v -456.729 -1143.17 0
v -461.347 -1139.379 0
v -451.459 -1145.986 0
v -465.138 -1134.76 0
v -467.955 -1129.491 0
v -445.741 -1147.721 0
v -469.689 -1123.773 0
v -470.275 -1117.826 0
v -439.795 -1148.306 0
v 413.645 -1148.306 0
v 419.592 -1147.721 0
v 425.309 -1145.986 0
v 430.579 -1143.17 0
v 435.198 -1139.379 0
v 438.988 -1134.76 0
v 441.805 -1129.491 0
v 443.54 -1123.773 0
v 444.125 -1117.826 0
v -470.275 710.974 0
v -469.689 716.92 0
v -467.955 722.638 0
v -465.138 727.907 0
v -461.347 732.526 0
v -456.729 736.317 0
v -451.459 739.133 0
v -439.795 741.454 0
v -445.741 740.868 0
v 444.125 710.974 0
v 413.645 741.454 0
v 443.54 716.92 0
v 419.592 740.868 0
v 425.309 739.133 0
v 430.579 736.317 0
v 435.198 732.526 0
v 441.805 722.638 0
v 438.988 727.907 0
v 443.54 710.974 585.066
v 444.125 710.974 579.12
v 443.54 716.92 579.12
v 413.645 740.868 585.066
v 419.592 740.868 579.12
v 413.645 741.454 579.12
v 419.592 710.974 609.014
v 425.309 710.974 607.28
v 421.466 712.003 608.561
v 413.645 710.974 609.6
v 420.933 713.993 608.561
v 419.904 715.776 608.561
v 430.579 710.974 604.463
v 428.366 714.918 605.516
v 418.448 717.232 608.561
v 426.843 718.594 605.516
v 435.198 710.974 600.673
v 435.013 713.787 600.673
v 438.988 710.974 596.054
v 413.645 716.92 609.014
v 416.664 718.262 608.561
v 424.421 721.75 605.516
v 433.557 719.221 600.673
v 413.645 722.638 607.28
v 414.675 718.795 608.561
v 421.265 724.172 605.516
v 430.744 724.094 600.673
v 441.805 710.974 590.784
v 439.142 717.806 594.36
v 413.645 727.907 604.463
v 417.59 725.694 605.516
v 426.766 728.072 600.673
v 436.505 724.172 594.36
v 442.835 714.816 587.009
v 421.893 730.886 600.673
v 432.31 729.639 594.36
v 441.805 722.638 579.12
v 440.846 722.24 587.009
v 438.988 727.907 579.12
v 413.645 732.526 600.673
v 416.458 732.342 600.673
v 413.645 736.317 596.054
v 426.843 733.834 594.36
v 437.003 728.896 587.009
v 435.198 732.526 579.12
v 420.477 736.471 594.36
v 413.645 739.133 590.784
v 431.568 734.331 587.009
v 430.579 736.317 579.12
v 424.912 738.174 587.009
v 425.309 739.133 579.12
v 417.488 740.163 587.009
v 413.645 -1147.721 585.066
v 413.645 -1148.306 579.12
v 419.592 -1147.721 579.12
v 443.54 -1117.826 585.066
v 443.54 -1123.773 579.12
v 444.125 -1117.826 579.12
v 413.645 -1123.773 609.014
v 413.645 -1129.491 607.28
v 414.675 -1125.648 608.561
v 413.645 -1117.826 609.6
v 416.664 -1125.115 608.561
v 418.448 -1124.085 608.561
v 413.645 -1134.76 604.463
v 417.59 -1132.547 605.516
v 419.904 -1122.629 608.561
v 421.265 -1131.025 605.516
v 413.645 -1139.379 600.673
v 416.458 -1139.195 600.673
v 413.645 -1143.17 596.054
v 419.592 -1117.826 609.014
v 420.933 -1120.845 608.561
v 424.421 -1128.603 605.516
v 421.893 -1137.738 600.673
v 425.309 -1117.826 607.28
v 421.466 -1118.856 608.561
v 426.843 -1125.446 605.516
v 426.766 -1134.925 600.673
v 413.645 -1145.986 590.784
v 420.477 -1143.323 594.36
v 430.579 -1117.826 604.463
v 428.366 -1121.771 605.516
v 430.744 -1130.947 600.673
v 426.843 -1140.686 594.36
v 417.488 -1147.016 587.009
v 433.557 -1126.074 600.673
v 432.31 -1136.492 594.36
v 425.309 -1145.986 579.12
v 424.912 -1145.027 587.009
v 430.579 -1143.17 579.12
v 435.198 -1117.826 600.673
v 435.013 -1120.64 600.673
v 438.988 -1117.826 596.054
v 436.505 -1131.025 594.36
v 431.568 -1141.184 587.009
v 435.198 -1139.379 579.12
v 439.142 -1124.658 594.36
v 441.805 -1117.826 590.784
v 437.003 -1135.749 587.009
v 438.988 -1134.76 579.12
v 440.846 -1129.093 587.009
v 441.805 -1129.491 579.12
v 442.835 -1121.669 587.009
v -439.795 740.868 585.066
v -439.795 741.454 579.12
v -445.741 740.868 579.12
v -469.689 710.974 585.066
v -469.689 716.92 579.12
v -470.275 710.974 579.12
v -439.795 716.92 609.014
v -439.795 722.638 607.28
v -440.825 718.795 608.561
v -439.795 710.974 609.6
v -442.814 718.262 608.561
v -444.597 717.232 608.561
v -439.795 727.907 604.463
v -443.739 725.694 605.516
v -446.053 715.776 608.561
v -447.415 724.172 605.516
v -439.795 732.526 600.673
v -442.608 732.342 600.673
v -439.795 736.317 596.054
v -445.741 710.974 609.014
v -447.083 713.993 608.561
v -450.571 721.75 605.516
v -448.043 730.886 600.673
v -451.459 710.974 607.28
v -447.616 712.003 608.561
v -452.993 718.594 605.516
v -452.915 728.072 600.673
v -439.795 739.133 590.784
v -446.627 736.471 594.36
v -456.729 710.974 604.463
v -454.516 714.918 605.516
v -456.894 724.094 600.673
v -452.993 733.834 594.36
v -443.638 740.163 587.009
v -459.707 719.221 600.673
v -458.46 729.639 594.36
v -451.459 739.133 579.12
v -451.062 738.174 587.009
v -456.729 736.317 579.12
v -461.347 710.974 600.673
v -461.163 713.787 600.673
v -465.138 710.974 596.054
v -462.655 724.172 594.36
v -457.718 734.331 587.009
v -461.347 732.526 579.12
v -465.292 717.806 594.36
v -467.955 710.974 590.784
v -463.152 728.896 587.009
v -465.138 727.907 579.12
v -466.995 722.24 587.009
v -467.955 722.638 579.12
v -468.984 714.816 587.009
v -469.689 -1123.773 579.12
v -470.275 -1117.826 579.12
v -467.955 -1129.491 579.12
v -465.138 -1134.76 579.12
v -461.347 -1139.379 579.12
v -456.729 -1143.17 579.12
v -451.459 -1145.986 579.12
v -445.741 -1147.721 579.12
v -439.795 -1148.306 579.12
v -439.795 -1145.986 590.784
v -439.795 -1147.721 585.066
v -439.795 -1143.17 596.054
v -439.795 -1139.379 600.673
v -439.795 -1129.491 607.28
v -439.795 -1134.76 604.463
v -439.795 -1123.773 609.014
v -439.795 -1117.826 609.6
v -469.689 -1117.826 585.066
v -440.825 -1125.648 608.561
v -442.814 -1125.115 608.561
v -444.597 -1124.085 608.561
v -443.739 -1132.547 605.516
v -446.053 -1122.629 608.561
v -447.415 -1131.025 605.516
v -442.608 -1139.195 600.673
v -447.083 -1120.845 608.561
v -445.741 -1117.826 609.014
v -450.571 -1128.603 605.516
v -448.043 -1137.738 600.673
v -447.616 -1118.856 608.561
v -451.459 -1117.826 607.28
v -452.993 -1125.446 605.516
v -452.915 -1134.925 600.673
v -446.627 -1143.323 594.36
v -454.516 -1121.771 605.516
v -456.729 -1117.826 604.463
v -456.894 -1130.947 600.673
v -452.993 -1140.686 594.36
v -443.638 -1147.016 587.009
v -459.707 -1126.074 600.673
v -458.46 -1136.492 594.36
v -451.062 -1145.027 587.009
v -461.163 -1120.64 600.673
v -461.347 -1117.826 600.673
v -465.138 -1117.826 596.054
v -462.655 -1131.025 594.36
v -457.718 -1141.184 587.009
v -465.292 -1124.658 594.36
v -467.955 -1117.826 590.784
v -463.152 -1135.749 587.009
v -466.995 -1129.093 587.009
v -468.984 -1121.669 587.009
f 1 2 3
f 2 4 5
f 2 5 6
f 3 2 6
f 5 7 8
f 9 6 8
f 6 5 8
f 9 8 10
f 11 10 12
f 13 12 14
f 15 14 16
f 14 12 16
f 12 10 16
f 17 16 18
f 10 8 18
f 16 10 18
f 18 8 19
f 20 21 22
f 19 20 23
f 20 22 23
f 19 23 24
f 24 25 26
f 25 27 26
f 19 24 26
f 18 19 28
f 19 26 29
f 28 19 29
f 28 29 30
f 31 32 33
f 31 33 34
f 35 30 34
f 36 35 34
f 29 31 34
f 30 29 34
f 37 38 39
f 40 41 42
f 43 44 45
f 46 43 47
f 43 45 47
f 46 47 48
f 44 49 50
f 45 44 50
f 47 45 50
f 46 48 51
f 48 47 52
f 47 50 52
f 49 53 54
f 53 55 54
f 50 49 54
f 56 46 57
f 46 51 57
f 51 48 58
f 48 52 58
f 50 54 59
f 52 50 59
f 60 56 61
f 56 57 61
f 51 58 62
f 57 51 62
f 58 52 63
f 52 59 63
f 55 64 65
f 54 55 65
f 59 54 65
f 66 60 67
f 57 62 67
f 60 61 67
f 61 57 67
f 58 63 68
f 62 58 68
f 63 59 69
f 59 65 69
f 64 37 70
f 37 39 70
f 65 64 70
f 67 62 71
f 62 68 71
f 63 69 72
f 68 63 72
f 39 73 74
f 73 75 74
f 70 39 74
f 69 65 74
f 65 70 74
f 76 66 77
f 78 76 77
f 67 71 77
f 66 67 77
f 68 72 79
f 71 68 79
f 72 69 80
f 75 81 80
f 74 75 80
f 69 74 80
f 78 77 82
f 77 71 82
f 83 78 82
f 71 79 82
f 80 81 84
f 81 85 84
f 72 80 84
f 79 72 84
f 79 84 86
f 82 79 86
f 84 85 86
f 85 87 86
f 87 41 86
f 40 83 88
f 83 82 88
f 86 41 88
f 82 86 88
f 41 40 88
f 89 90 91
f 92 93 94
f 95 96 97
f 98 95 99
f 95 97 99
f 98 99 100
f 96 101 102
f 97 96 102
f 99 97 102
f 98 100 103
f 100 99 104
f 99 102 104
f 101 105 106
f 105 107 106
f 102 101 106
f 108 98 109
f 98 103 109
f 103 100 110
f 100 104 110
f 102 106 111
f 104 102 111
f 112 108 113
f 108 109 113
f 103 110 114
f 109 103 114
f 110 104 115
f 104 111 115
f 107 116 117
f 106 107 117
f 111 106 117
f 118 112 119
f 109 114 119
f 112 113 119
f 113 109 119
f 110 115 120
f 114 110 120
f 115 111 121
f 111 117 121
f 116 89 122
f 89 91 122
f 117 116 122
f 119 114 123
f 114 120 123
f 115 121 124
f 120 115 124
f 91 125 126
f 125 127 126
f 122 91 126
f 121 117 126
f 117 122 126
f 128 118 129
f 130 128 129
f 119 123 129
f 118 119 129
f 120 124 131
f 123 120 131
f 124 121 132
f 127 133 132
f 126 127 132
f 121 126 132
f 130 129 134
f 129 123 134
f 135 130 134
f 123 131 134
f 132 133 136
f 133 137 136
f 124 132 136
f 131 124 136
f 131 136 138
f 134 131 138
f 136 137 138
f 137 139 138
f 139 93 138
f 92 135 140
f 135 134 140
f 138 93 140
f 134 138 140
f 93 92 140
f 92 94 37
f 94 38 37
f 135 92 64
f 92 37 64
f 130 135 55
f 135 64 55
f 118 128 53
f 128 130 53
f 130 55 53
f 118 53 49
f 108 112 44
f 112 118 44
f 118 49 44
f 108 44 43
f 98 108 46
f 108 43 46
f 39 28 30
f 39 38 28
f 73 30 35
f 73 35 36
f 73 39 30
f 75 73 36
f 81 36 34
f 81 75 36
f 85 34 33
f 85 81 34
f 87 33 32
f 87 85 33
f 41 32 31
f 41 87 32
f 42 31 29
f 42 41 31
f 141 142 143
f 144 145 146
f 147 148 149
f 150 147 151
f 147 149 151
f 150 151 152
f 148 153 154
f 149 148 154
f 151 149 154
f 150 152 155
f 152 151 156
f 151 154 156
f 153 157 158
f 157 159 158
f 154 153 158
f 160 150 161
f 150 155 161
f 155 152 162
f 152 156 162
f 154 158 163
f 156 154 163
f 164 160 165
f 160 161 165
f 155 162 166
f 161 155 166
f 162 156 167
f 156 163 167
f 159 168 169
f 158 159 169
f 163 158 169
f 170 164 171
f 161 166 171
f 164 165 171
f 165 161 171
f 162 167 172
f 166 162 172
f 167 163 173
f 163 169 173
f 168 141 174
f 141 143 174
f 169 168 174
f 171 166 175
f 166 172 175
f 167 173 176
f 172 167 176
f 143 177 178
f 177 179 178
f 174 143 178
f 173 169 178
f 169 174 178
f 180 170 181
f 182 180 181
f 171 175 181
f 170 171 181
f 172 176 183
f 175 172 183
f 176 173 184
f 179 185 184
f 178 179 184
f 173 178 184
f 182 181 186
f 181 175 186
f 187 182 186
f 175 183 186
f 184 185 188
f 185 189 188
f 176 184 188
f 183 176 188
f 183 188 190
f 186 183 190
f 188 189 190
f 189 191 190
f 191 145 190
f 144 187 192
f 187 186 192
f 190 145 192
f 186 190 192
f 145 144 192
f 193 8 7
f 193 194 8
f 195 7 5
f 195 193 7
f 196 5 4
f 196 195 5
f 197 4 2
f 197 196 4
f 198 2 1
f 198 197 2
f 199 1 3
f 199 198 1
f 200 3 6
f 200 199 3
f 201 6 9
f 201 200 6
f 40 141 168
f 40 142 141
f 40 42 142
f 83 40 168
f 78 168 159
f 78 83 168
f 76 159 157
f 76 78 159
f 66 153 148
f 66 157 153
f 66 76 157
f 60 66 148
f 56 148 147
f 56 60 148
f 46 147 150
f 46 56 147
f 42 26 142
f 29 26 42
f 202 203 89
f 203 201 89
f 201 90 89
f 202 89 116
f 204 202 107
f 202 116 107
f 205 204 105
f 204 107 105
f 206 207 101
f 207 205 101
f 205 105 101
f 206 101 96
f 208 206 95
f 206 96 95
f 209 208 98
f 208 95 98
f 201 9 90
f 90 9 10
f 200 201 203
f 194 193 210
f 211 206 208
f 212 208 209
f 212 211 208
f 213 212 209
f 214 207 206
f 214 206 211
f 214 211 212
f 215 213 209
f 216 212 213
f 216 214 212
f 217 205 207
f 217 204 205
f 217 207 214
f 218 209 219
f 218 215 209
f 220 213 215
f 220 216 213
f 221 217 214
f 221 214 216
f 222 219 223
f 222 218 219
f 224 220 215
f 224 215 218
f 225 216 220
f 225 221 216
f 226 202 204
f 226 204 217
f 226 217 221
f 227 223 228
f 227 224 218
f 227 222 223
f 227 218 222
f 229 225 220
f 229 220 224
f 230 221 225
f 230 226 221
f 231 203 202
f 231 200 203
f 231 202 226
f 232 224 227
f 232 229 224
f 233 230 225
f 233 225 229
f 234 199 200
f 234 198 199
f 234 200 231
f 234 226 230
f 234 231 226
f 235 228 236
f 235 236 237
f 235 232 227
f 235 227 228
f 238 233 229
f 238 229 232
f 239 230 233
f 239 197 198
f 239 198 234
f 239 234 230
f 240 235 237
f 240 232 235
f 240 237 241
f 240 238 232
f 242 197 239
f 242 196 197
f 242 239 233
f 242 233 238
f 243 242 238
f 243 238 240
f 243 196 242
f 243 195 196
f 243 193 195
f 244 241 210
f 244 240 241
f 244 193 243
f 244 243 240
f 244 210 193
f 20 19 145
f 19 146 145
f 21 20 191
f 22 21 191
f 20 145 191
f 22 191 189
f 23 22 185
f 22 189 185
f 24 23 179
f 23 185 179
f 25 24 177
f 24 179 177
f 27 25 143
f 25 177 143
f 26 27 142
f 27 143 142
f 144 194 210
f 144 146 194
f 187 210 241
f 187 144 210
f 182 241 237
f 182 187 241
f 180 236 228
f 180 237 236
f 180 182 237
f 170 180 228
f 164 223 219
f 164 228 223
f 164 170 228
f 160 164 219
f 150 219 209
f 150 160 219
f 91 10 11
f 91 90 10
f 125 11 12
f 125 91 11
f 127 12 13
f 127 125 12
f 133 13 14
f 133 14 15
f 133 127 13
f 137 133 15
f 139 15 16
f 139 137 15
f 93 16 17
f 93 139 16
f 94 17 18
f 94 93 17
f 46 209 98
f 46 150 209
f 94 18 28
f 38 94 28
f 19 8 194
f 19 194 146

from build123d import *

# Parameters (mm, degrees)
F0_W     = 914.4
F0_H     = 1889.76
F1_DEPTH = 609.6
F3_R     = 30.48


# Not quite as in the source:
# - a feature of the source that left no trace in its solid (it failed there, or was rolled back) is left out


with BuildPart() as f1:
    # F0 (on Top) → F1 (new body)
    with BuildSketch(Plane.XY):
        with Locations((-13.0748171359, -203.4263992494)):
            Rectangle(F0_W, F0_H)
    extrude(amount=F1_DEPTH)

    # F3
    f3_edges = [f1.edges().sort_by_distance(p)[0] for p in [
        (-470.274817, -1148.306399, 304.8),
        (444.125183, -1148.306399, 304.8),
        (-13.074817, -1148.306399, 609.6),
        (444.125183, 741.453601, 304.8),
        (444.125183, -203.426399, 609.6),
        (-470.274817, 741.453601, 304.8),
        (-13.074817, 741.453601, 609.6),
        (-470.274817, -203.426399, 609.6),
    ]]
    fillet(f3_edges, radius=F3_R)


solid = f1.part
